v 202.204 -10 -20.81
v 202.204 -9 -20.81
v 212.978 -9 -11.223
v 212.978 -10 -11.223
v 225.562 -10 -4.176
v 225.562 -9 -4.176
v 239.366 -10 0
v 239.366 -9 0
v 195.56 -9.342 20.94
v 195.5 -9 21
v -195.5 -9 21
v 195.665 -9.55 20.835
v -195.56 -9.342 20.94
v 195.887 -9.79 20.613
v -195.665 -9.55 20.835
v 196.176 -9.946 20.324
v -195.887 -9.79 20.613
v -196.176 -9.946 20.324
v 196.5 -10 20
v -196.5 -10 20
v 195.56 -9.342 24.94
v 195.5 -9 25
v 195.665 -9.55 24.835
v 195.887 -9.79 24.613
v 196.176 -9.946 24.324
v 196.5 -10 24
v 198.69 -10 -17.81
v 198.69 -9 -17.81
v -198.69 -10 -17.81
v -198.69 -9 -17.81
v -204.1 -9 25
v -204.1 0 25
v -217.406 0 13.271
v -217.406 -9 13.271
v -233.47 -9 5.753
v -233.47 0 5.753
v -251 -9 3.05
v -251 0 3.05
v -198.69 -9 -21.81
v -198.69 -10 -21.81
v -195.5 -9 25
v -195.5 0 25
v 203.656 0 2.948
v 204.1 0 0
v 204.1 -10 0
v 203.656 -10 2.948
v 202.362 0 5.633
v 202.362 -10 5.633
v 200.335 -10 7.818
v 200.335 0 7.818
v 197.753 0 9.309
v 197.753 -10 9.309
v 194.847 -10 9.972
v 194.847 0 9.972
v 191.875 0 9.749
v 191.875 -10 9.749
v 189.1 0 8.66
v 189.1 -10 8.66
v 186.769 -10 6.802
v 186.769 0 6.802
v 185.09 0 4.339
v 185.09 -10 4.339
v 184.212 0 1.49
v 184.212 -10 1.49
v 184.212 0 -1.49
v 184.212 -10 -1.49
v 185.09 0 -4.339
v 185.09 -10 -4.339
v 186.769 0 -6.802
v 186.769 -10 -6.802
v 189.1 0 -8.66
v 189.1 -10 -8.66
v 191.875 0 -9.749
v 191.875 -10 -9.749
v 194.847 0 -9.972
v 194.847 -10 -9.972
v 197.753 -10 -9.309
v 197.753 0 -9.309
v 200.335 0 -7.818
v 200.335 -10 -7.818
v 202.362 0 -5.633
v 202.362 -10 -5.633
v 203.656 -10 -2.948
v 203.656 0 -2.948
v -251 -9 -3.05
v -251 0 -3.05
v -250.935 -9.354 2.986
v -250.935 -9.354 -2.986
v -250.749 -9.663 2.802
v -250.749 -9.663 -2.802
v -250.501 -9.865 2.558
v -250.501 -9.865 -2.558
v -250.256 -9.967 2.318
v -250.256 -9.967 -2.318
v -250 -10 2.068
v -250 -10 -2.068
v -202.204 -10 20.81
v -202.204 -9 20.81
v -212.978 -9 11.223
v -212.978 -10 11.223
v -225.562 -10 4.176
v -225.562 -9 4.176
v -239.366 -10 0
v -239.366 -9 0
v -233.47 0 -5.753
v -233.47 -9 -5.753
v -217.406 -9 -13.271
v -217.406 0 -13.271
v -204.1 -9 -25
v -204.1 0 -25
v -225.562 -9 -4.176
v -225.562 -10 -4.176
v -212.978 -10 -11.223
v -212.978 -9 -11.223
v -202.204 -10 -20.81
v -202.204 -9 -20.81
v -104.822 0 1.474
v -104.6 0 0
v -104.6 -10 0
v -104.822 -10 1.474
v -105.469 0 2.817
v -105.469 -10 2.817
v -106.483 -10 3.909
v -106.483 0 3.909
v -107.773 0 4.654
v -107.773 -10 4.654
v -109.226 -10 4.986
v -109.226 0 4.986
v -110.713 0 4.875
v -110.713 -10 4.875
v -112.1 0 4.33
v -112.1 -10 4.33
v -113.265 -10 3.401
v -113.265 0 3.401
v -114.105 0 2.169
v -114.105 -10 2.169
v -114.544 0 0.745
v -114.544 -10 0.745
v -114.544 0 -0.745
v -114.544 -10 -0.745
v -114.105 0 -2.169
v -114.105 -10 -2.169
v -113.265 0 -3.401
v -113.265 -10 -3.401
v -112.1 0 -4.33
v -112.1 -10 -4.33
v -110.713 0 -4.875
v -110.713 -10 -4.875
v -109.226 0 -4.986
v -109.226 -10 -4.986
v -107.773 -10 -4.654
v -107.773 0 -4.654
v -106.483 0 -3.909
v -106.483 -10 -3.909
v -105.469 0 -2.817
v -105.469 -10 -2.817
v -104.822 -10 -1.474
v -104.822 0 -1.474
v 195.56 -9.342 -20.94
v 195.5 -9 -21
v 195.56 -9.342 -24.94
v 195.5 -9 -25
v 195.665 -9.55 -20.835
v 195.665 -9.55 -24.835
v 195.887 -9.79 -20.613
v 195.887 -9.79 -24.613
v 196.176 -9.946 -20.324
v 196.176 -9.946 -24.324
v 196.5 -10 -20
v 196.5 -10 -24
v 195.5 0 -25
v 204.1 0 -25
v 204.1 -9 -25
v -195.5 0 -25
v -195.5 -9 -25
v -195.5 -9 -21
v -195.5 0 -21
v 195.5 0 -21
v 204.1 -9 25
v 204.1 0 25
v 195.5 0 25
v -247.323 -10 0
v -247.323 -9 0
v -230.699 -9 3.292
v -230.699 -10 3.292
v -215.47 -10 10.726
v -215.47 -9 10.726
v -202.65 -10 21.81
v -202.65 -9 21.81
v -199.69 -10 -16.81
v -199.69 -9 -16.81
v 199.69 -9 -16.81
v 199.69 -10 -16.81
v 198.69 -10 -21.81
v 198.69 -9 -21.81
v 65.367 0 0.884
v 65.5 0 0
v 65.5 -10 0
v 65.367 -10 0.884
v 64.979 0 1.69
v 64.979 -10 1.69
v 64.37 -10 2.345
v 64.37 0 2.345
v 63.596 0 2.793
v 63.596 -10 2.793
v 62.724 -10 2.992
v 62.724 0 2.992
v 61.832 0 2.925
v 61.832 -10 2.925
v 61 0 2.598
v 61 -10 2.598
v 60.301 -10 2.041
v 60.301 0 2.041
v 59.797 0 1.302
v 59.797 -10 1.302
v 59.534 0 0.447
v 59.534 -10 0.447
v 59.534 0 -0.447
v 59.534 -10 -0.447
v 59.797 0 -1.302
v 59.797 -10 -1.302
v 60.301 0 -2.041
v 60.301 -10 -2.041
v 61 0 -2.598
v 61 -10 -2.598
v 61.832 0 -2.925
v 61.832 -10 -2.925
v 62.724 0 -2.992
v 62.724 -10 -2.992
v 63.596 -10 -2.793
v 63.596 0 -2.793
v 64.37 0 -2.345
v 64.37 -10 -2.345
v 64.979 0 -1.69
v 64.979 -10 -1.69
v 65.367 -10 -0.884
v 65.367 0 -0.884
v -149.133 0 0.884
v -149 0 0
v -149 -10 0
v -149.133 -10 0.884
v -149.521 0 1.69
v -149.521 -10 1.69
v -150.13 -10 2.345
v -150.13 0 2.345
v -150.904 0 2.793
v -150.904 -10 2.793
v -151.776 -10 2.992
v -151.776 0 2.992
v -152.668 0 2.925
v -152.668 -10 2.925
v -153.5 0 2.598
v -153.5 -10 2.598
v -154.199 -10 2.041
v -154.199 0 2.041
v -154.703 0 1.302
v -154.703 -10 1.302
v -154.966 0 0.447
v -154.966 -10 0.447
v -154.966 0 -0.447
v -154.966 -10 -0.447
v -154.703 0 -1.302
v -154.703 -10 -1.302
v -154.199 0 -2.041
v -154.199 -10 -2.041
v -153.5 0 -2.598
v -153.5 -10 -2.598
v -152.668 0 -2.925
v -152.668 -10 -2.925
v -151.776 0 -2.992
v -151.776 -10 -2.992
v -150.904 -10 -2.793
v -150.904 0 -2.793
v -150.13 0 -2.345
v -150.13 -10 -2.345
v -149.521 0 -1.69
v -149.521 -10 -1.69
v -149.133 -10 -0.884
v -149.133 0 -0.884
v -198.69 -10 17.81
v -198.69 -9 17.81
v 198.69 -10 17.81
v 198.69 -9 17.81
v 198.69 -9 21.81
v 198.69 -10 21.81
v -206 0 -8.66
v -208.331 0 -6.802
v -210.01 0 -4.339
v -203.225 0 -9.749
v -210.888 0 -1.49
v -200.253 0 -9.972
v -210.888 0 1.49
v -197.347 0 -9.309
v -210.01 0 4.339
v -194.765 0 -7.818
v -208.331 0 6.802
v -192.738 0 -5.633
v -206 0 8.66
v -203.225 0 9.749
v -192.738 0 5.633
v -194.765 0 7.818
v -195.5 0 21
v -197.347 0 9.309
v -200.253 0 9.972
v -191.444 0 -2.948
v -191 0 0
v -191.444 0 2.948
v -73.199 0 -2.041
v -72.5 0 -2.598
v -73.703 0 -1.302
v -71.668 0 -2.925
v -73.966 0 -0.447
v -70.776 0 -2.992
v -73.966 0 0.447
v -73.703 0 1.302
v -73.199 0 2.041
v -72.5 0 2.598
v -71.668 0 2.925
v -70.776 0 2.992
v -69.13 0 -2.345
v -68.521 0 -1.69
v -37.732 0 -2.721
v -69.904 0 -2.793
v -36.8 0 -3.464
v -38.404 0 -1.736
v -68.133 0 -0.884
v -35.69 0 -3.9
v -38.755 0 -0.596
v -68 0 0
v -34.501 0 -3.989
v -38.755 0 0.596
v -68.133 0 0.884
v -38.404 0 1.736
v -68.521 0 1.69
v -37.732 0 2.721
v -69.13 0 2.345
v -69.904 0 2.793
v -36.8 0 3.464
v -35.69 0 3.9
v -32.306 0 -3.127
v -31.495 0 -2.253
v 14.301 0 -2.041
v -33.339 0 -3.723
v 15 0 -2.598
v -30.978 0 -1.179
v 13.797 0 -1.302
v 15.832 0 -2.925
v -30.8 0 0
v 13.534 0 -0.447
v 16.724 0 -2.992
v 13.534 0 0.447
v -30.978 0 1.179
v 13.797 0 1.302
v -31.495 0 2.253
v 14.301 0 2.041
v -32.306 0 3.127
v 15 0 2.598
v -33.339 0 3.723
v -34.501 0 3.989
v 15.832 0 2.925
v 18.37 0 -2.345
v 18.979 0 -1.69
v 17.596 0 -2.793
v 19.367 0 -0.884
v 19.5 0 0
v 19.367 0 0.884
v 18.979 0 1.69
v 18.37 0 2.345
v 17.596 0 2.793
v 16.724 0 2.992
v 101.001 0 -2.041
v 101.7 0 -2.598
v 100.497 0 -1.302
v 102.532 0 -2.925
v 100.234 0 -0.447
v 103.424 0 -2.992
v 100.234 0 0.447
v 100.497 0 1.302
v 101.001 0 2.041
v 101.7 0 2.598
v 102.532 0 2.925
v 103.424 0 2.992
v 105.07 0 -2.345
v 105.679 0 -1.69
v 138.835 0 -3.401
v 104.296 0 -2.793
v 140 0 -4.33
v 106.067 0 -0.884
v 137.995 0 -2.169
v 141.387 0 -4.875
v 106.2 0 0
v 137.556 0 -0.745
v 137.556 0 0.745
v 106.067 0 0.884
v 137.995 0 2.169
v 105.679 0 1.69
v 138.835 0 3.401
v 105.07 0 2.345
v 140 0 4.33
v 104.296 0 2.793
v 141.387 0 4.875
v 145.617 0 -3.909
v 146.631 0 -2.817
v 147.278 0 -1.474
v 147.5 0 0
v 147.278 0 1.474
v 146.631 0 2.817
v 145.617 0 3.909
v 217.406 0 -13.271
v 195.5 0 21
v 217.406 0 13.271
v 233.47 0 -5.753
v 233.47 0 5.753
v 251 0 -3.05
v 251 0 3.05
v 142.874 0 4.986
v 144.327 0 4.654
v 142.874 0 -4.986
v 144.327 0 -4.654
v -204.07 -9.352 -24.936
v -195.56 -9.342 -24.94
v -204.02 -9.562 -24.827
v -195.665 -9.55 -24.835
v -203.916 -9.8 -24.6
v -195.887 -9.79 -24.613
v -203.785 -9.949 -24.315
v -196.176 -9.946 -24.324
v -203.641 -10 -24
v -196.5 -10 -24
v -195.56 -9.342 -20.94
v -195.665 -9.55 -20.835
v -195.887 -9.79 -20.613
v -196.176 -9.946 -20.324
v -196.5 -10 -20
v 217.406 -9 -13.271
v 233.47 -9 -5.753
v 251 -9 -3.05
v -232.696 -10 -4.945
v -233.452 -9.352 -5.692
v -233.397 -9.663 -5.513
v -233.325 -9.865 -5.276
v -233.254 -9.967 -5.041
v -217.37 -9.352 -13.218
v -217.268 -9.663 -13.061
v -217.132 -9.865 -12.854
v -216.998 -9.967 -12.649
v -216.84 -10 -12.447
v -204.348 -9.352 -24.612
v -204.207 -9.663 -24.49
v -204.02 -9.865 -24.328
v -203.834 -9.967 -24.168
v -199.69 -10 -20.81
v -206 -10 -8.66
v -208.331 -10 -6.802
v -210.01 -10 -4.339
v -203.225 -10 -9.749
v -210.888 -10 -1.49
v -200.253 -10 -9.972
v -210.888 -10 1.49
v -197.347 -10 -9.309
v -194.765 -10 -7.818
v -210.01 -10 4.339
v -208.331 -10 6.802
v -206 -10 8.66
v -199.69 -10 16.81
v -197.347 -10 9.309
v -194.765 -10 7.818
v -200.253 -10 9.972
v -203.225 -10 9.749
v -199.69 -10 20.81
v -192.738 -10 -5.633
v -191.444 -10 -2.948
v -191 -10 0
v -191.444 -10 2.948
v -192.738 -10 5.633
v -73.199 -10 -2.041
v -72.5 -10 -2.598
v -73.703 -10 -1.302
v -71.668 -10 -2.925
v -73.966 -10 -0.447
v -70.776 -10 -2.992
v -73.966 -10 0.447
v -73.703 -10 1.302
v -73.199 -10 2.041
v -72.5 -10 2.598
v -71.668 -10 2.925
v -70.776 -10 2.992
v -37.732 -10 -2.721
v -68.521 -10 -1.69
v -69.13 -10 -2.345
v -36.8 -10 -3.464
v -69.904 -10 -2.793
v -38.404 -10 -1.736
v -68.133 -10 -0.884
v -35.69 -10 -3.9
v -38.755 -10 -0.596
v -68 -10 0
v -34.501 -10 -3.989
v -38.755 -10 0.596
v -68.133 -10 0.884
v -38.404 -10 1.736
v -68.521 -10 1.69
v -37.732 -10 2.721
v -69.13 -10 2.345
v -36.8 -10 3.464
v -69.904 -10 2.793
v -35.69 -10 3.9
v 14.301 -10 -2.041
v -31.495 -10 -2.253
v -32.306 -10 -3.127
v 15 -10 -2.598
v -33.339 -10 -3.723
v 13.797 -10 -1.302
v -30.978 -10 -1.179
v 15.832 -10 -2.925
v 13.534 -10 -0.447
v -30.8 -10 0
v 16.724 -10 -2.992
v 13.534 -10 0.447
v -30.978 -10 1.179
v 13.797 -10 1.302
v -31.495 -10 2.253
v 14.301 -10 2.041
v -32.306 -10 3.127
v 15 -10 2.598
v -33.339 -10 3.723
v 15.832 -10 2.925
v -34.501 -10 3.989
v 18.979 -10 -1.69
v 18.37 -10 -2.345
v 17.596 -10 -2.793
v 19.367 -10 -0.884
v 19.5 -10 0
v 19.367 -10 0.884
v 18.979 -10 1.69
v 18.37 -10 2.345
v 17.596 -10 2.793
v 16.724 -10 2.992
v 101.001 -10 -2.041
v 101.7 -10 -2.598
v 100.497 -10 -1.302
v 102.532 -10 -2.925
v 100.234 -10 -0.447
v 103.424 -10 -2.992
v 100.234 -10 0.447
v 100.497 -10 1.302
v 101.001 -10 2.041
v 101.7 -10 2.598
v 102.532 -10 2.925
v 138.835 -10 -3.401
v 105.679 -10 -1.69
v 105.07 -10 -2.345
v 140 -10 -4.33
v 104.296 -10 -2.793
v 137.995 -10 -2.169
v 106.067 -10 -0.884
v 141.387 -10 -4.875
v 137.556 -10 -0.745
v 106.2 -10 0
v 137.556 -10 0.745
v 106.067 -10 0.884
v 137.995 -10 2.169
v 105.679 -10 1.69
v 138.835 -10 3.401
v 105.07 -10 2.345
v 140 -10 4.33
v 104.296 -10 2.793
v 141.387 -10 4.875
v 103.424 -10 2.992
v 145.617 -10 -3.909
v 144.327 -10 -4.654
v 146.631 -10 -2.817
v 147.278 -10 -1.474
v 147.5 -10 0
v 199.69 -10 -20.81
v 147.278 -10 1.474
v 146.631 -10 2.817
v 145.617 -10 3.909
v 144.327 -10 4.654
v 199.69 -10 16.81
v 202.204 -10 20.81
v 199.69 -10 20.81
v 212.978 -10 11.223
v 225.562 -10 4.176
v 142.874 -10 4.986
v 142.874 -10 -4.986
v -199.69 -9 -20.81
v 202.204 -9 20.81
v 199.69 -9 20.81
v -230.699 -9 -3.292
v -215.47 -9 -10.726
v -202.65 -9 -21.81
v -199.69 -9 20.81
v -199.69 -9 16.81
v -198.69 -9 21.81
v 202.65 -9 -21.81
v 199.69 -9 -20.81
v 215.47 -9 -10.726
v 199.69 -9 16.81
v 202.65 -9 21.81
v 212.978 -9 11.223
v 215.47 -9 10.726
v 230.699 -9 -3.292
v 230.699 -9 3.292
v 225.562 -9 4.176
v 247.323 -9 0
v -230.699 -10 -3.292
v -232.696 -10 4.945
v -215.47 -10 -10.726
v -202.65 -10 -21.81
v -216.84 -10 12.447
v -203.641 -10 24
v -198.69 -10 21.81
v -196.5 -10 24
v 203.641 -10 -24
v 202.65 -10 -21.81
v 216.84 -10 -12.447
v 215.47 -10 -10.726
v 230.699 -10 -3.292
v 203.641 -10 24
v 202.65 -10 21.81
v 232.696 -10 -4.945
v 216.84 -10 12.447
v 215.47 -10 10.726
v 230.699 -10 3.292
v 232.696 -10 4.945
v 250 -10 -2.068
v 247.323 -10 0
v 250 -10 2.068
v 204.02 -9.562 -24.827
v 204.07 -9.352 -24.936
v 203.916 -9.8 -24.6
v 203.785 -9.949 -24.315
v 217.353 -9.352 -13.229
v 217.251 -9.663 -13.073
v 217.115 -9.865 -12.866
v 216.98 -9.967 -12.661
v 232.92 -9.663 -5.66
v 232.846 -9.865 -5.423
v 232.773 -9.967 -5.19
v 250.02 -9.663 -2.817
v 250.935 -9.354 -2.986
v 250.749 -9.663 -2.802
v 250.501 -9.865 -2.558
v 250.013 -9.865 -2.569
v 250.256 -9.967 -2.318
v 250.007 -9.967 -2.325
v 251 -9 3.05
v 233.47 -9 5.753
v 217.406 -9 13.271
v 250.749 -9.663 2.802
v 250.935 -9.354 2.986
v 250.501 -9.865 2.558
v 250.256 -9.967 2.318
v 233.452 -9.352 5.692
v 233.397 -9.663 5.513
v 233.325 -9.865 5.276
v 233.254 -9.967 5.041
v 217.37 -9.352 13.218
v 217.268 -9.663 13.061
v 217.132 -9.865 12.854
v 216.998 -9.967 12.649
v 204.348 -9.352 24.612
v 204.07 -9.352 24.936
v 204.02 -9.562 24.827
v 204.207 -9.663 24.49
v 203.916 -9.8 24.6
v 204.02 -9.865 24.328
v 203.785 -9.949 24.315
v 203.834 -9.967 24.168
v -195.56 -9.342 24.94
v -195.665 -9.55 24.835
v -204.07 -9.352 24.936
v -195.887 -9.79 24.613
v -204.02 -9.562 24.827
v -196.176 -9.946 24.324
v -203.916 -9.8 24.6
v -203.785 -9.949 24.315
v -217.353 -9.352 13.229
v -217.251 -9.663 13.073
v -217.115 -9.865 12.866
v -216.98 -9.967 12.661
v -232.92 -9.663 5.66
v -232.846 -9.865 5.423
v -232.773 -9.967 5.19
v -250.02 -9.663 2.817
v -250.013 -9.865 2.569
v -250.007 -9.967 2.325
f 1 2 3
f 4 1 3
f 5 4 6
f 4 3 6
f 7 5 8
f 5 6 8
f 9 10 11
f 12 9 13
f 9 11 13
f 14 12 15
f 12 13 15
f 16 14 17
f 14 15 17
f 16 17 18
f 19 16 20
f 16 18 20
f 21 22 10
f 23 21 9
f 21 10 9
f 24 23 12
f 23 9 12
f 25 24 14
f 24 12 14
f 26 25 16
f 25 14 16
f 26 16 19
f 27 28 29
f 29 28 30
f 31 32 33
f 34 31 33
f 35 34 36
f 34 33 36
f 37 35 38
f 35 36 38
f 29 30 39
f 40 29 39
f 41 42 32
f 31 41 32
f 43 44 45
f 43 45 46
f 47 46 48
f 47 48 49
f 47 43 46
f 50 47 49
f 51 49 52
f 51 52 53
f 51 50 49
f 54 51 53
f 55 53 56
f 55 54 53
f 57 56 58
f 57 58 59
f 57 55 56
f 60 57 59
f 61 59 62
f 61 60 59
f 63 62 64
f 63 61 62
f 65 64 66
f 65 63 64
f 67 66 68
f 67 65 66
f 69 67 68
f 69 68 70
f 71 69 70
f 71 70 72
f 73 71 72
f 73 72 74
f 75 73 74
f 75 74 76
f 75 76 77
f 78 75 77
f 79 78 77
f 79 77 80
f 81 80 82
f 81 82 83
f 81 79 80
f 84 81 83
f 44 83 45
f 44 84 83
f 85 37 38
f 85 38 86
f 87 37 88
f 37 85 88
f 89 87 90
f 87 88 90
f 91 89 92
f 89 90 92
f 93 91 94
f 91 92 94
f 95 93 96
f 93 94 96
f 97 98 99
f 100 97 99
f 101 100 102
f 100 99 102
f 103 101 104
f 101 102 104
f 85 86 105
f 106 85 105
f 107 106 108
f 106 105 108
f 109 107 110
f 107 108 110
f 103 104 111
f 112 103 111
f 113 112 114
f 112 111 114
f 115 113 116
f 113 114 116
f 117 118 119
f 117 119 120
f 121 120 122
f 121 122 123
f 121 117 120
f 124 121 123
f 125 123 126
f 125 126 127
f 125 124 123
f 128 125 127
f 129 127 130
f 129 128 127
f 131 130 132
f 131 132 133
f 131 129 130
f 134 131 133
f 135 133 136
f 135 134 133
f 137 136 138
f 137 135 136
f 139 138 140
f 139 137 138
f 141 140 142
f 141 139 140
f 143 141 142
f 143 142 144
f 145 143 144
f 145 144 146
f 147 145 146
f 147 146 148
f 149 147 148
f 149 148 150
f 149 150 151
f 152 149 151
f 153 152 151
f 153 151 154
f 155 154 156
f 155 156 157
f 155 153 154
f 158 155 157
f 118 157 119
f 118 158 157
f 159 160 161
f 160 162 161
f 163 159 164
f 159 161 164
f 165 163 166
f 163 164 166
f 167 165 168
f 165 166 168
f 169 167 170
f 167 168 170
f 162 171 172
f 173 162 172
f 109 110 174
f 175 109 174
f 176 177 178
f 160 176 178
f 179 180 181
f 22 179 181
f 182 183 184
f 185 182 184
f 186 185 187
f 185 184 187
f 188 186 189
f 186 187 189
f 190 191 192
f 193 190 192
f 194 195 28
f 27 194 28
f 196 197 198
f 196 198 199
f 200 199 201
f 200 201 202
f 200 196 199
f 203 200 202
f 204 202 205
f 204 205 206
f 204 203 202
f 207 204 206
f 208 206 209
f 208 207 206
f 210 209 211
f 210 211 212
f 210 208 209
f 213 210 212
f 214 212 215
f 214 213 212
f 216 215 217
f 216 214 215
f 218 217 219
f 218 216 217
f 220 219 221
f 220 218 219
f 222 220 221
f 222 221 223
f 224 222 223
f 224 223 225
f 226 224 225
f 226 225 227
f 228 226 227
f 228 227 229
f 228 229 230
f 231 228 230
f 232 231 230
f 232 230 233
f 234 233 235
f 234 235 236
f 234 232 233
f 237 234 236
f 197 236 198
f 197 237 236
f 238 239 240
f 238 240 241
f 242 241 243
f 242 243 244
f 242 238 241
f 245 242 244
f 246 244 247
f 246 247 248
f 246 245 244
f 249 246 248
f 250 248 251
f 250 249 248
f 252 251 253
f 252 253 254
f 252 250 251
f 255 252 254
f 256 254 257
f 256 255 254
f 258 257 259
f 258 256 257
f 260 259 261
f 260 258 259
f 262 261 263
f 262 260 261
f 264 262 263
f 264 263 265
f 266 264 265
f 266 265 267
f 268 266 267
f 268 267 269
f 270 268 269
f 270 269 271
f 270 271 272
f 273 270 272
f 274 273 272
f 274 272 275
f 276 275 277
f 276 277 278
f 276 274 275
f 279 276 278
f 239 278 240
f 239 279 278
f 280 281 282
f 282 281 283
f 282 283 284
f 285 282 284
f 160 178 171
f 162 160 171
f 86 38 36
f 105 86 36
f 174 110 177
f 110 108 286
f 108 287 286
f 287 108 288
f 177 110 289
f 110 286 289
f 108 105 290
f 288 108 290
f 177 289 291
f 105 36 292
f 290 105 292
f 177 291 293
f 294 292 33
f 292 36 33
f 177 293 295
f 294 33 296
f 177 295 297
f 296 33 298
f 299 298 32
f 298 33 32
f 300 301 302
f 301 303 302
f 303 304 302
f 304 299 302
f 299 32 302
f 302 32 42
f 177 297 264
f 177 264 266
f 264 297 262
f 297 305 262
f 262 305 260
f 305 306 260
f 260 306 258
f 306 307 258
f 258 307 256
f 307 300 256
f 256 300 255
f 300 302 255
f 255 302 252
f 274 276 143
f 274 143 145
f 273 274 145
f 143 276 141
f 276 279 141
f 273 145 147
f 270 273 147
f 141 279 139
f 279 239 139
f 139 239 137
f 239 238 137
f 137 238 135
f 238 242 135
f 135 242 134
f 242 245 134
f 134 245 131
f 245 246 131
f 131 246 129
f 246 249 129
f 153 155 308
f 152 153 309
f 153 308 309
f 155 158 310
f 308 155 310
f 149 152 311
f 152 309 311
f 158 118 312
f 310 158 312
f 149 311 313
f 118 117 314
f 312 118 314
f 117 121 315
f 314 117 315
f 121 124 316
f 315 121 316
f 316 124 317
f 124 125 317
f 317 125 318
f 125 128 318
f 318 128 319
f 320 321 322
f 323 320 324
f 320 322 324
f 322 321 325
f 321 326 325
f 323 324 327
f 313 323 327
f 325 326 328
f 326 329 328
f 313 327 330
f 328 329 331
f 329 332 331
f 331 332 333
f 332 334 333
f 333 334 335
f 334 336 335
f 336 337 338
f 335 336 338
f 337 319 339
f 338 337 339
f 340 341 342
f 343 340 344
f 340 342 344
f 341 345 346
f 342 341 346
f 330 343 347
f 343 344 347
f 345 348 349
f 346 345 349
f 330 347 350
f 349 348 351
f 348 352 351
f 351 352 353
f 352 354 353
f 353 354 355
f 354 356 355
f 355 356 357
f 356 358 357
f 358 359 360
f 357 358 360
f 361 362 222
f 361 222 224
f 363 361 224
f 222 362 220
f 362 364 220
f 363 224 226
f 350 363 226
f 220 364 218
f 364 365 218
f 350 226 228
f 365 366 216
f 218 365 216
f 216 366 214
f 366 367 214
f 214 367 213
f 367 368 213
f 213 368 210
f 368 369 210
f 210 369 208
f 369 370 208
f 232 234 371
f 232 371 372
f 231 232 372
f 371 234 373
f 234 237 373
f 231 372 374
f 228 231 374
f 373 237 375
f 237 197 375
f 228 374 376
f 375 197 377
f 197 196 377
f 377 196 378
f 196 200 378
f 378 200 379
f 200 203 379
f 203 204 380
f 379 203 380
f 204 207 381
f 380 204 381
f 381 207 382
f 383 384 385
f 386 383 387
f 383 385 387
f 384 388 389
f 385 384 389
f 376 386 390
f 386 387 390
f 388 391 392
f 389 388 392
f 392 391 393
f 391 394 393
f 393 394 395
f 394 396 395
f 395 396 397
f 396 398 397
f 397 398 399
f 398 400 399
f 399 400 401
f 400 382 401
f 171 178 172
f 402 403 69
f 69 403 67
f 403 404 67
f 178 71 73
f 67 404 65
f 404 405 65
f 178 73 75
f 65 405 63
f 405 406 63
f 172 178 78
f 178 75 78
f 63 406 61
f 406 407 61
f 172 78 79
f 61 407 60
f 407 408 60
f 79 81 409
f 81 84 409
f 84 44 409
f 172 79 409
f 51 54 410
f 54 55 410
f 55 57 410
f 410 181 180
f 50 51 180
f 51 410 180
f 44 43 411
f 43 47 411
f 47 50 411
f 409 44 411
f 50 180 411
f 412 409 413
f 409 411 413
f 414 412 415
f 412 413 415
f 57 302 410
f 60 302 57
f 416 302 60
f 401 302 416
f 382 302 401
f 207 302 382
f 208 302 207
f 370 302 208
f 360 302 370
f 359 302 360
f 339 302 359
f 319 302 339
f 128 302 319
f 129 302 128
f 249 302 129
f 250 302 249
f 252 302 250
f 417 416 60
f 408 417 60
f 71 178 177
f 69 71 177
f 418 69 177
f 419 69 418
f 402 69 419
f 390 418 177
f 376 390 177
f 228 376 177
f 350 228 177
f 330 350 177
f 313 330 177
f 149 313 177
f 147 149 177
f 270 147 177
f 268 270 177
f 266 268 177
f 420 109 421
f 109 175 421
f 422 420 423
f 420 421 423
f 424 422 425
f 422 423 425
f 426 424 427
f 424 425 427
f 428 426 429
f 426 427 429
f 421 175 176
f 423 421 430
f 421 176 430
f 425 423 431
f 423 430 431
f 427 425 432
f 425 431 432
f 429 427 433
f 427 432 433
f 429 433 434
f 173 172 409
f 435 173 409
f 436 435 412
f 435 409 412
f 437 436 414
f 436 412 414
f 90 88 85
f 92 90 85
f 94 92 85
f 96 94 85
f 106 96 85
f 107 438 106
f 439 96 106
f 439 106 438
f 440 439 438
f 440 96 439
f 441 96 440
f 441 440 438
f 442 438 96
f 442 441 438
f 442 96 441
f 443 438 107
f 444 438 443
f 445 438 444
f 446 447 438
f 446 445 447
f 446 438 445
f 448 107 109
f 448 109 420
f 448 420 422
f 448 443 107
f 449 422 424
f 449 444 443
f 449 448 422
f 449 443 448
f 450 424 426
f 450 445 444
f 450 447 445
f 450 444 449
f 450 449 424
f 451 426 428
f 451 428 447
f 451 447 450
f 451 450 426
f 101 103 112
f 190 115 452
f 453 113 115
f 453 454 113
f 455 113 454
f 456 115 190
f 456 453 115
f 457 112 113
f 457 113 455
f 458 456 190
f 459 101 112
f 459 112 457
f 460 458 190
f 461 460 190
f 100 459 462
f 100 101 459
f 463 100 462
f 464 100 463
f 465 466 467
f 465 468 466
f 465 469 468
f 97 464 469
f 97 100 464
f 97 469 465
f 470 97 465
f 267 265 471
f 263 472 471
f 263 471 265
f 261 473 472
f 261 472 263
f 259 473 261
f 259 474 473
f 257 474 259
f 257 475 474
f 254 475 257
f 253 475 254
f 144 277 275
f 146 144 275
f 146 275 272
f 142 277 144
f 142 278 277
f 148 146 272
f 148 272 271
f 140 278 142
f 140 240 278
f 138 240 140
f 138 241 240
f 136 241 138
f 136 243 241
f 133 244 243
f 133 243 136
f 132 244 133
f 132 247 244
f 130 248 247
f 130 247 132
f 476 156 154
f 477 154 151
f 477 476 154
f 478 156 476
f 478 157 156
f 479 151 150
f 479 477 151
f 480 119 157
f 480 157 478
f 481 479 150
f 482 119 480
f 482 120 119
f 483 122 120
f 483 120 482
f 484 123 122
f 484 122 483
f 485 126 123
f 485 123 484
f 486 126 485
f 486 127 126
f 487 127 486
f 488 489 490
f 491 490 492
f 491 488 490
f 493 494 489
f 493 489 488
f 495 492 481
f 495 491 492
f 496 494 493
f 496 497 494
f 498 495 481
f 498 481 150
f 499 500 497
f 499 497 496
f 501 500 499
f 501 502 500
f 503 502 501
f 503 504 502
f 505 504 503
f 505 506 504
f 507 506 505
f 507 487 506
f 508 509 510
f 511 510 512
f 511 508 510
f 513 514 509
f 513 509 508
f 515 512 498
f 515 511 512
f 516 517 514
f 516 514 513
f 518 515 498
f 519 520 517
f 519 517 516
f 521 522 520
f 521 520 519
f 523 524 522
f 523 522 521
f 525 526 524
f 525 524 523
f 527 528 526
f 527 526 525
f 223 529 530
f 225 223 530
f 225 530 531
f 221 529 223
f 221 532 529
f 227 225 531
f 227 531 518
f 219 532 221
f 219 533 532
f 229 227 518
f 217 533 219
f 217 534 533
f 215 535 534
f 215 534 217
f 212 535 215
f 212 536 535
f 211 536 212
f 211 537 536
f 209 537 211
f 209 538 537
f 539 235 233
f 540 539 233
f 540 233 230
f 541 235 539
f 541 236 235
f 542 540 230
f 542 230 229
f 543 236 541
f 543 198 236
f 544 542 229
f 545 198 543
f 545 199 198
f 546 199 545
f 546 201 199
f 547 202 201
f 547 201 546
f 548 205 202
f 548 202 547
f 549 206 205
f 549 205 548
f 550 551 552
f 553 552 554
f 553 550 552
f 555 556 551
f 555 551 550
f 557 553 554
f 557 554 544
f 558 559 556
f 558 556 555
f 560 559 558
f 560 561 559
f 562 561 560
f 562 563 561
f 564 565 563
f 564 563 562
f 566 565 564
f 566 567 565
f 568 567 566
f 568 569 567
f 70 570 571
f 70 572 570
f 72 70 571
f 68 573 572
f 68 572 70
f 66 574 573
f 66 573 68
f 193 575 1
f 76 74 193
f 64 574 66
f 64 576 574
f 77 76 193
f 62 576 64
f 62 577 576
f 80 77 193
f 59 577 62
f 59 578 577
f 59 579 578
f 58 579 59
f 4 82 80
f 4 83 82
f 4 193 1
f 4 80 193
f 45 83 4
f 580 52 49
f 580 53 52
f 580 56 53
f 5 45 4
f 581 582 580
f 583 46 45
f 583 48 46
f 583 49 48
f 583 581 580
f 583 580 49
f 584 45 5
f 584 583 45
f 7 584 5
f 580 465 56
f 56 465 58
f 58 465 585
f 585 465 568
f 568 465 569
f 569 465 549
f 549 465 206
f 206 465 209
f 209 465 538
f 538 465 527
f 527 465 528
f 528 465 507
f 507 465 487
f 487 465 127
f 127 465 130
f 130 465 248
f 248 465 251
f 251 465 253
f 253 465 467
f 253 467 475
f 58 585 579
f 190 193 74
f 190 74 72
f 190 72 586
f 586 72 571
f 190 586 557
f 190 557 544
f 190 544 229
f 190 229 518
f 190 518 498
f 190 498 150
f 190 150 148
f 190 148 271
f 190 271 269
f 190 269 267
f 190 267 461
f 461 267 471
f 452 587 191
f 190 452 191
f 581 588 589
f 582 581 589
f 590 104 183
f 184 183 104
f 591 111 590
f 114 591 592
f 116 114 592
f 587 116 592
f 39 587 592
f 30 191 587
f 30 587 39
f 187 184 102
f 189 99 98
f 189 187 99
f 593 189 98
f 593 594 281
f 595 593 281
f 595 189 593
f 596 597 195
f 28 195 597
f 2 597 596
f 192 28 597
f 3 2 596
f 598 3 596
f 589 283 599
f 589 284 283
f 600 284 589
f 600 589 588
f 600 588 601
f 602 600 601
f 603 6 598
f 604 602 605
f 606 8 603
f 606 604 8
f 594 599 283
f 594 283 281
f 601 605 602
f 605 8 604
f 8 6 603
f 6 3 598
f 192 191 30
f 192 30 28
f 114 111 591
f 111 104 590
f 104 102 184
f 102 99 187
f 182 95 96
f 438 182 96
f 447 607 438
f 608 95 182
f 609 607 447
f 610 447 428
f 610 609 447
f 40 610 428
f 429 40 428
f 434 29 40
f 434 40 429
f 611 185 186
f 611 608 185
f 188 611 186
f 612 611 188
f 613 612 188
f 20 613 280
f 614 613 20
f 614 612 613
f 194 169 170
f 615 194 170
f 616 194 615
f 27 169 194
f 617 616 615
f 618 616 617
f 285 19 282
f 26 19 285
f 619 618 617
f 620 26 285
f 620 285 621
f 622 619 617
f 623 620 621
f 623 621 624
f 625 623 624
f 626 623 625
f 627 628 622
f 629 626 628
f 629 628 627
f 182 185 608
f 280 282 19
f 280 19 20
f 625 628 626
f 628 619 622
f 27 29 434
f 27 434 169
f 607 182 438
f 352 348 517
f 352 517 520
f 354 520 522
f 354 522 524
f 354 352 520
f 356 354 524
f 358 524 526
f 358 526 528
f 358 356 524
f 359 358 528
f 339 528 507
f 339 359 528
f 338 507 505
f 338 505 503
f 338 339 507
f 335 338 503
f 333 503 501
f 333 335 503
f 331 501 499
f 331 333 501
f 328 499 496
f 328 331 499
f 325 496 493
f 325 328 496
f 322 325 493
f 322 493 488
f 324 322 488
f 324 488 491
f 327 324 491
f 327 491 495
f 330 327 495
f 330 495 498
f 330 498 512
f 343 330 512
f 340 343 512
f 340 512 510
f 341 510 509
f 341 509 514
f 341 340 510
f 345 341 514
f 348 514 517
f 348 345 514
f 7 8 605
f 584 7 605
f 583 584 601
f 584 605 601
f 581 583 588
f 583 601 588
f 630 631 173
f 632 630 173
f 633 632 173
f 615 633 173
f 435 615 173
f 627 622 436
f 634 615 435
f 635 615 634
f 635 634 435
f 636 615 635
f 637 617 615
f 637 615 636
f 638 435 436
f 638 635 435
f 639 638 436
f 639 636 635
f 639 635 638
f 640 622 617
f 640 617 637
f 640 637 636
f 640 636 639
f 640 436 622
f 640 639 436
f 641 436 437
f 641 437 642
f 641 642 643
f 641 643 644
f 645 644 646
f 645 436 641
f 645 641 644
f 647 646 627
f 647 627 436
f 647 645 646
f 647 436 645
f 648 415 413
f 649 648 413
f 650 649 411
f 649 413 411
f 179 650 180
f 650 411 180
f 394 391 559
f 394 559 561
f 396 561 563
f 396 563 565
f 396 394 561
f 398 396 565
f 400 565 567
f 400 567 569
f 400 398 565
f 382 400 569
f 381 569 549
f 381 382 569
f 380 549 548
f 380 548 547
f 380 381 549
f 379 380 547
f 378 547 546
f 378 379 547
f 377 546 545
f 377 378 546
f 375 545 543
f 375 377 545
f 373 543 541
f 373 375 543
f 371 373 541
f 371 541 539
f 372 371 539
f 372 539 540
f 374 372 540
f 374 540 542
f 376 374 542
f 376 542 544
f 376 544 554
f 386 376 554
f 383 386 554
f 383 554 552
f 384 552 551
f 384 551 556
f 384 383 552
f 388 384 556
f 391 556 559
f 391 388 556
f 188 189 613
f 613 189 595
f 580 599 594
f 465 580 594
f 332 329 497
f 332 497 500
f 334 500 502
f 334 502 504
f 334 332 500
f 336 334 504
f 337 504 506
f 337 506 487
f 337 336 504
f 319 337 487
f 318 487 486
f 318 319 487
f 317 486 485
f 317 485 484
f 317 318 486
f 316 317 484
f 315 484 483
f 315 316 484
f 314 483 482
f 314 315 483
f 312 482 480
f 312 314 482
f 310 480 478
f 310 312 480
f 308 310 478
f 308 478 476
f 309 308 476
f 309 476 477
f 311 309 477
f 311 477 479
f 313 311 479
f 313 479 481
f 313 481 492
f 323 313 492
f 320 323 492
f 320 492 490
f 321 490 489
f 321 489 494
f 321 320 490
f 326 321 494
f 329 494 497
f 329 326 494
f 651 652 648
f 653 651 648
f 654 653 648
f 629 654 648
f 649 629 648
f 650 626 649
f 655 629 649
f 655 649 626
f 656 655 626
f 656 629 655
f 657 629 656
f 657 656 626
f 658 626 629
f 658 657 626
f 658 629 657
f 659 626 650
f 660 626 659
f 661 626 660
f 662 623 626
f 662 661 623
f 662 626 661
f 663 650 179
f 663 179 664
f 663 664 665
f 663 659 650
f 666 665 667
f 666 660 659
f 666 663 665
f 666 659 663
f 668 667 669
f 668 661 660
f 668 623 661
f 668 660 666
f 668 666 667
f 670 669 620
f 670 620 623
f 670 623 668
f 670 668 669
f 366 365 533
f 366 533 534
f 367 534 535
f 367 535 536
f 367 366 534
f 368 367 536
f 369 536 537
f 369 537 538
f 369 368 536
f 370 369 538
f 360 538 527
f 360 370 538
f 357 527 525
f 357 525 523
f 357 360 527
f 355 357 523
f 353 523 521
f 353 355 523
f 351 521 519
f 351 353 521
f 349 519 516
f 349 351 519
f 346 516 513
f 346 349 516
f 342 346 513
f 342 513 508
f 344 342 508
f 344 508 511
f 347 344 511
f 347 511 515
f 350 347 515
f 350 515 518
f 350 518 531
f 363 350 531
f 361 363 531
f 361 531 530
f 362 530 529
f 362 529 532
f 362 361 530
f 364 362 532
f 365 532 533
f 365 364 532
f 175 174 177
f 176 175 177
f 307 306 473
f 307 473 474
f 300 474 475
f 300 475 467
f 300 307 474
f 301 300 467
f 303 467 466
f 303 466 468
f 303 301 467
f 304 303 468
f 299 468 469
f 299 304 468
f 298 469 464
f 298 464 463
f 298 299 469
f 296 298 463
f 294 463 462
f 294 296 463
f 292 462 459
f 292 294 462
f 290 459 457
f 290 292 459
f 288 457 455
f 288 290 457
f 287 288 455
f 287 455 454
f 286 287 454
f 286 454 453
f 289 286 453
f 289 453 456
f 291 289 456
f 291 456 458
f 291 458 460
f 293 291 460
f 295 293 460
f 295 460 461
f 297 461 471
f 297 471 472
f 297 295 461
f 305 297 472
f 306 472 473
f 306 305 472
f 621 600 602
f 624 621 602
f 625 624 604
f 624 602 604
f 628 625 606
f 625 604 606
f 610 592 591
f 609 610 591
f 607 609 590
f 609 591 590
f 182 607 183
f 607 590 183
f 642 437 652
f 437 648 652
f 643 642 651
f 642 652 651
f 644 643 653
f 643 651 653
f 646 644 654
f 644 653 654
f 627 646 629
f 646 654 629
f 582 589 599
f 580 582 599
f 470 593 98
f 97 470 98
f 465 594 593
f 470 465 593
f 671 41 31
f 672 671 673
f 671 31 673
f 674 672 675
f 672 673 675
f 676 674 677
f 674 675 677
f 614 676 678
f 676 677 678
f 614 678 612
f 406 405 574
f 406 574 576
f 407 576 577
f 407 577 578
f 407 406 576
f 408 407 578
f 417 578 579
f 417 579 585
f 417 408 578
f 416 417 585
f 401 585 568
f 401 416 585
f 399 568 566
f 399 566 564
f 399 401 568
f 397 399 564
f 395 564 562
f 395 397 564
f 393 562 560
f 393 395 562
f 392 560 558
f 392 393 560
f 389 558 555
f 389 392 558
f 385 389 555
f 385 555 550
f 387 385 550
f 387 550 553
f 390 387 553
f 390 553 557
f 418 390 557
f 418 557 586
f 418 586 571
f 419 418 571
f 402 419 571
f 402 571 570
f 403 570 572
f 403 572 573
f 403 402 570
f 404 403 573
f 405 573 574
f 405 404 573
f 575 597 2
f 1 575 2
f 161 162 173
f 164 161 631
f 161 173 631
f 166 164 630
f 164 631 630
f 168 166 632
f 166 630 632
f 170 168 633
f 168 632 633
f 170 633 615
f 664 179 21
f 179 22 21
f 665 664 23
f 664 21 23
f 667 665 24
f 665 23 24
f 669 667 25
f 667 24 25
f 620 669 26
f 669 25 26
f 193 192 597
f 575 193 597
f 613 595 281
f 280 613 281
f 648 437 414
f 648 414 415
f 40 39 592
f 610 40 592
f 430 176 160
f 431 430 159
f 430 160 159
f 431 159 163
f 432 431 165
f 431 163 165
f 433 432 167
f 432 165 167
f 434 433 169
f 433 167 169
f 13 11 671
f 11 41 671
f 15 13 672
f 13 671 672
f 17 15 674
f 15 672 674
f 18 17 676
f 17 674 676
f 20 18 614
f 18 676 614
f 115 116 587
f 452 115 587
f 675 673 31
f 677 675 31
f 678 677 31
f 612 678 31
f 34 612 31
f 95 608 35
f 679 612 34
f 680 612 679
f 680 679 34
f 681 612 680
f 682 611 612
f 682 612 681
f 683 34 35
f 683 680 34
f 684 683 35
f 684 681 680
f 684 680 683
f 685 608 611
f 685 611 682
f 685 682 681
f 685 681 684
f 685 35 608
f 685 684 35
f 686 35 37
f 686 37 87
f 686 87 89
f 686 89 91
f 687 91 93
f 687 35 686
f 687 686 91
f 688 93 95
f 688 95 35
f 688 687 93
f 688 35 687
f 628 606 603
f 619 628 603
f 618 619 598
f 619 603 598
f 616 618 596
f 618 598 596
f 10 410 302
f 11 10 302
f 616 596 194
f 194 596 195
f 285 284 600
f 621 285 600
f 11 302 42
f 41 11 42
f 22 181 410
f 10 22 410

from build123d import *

# Parameters (mm, degrees)
F0_R     = 10
F0_R_2   = 3
F0_R_3   = 5
F0_R_4   = 4
F1_DEPTH = 10
F2_R     = 1
F3_DEPTH = 9


with BuildPart() as f1:
    # F0 (on Front) → F1 (new body)
    with BuildSketch(Plane.XZ):
        with BuildLine():
            Line((195.5, -25), (204.1, -25))
            ThreePointArc((204.1, -25), (225.169837, -8.939366), (251, -3.05))
            Line((251, -3.05), (251, 3.05))
            ThreePointArc((251, 3.05), (225.169837, 8.939366), (204.1, 25))
            Line((204.1, 25), (195.5, 25))
            Line((195.5, 25), (195.5, 21))
            Line((195.5, 21), (-195.5, 21))
            Line((-195.5, 21), (-195.5, 25))
            Line((-195.5, 25), (-204.1, 25))
            ThreePointArc((-204.1, 25), (-225.169837, 8.939366), (-251, 3.05))
            Line((-251, 3.05), (-251, -3.05))
            ThreePointArc((-251, -3.05), (-225.169837, -8.939366), (-204.1, -25))
            Line((-204.1, -25), (-195.5, -25))
            Line((-195.5, -25), (-195.5, -21))
            Line((-195.5, -21), (195.5, -21))
            Line((195.5, -21), (195.5, -25))
        make_face()
        with BuildLine():
            Line((-202.64971, 21.81), (-198.69, 21.81))
            Line((-198.69, 21.81), (-198.69, 17.81))
            Line((-198.69, 17.81), (198.69, 17.81))
            Line((198.69, 17.81), (198.69, 21.81))
            Line((198.69, 21.81), (202.64971, 21.81))
            ThreePointArc((202.64971, 21.81), (222.843542, 6.515825), (247.323057, 0))
            ThreePointArc((247.323057, 0), (222.843542, -6.515825), (202.64971, -21.81))
            Line((202.64971, -21.81), (198.69, -21.81))
            Line((198.69, -21.81), (198.69, -17.81))
            Line((198.69, -17.81), (-198.69, -17.81))
            Line((-198.69, -17.81), (-198.69, -21.81))
            Line((-198.69, -21.81), (-202.64971, -21.81))
            ThreePointArc((-202.64971, -21.81), (-222.843542, -6.515825), (-247.323057, 0))
            ThreePointArc((-247.323057, 0), (-222.843542, 6.515825), (-202.64971, 21.81))
        make_face(mode=Mode.SUBTRACT)
        with BuildLine():
            Line((202.203828, 20.81), (199.69, 20.81))
            Line((199.69, 20.81), (199.69, 16.81))
            Line((199.69, 16.81), (-199.69, 16.81))
            Line((-199.69, 16.81), (-199.69, 20.81))
            Line((-199.69, 20.81), (-202.203828, 20.81))
            ThreePointArc((-202.203828, 20.81), (-219.078949, 7.358512), (-239.366002, 0))
            ThreePointArc((-239.366002, 0), (-219.078949, -7.358512), (-202.203828, -20.81))
            Line((-202.203828, -20.81), (-199.69, -20.81))
            Line((-199.69, -20.81), (-199.69, -16.81))
            Line((-199.69, -16.81), (199.69, -16.81))
            Line((199.69, -16.81), (199.69, -20.81))
            Line((199.69, -20.81), (202.203828, -20.81))
            ThreePointArc((202.203828, -20.81), (219.078949, -7.358512), (239.366002, 0))
            ThreePointArc((239.366002, 0), (219.078949, 7.358512), (202.203828, 20.81))
        make_face()
        with Locations((-201, 0)):
            Circle(F0_R, mode=Mode.SUBTRACT)
        with Locations((-152, 0)):
            Circle(F0_R_2, mode=Mode.SUBTRACT)
        with Locations((-109.6, 0)):
            Circle(F0_R_3, mode=Mode.SUBTRACT)
        with Locations((-71, 0)):
            Circle(F0_R_2, mode=Mode.SUBTRACT)
        with Locations((-34.8, 0)):
            Circle(F0_R_4, mode=Mode.SUBTRACT)
        with Locations((16.5, 0)):
            Circle(F0_R_2, mode=Mode.SUBTRACT)
        with Locations((62.5, 0)):
            Circle(F0_R_2, mode=Mode.SUBTRACT)
        with Locations((103.2, 0)):
            Circle(F0_R_2, mode=Mode.SUBTRACT)
        with Locations((142.5, 0)):
            Circle(F0_R_3, mode=Mode.SUBTRACT)
        with Locations((194.1, 0)):
            Circle(F0_R, mode=Mode.SUBTRACT)
    extrude(amount=F1_DEPTH)

    # F2
    f2_edges = [f1.edges().sort_by_distance(p)[0] for p in [
        (0, -10, 21),
        (-195.5, -10, 23),
        (-251, -10, 0),
        (-225.169837, -10, -8.939366),
        (-199.8, -10, -25),
        (-195.5, -10, -23),
        (0, -10, -21),
        (195.5, -10, -23),
        (199.8, -10, -25),
        (225.169837, -10, -8.939366),
        (251, -10, 0),
        (225.169837, -10, 8.939366),
        (199.8, -10, 25),
        (195.5, -10, 23),
        (-199.8, -10, 25),
        (-225.169837, -10, 8.939366),
    ]]
    fillet(f2_edges, radius=F2_R)

    # F0 (on Front) → F3 (join)
    with BuildSketch(Plane.XZ):
        with BuildLine():
            Line((-198.69, 17.81), (-198.69, 21.81))
            Line((-198.69, 21.81), (-202.64971, 21.81))
            ThreePointArc((-202.64971, 21.81), (-222.843542, 6.515825), (-247.323057, 0))
            ThreePointArc((-247.323057, 0), (-222.843542, -6.515825), (-202.64971, -21.81))
            Line((-202.64971, -21.81), (-198.69, -21.81))
            Line((-198.69, -21.81), (-198.69, -17.81))
            Line((-198.69, -17.81), (198.69, -17.81))
            Line((198.69, -17.81), (198.69, -21.81))
            Line((198.69, -21.81), (202.64971, -21.81))
            ThreePointArc((202.64971, -21.81), (222.843542, -6.515825), (247.323057, 0))
            ThreePointArc((247.323057, 0), (222.843542, 6.515825), (202.64971, 21.81))
            Line((202.64971, 21.81), (198.69, 21.81))
            Line((198.69, 21.81), (198.69, 17.81))
            Line((198.69, 17.81), (-198.69, 17.81))
        make_face()
        with BuildLine():
            Line((199.69, 16.81), (199.69, 20.81))
            Line((199.69, 20.81), (202.203828, 20.81))
            ThreePointArc((202.203828, 20.81), (219.078949, 7.358512), (239.366002, 0))
            ThreePointArc((239.366002, 0), (219.078949, -7.358512), (202.203828, -20.81))
            Line((202.203828, -20.81), (199.69, -20.81))
            Line((199.69, -20.81), (199.69, -16.81))
            Line((199.69, -16.81), (-199.69, -16.81))
            Line((-199.69, -16.81), (-199.69, -20.81))
            Line((-199.69, -20.81), (-202.203828, -20.81))
            ThreePointArc((-202.203828, -20.81), (-219.078949, -7.358512), (-239.366002, 0))
            ThreePointArc((-239.366002, 0), (-219.078949, 7.358512), (-202.203828, 20.81))
            Line((-202.203828, 20.81), (-199.69, 20.81))
            Line((-199.69, 20.81), (-199.69, 16.81))
            Line((-199.69, 16.81), (199.69, 16.81))
        make_face(mode=Mode.SUBTRACT)
    extrude(amount=F3_DEPTH)


solid = f1.part
